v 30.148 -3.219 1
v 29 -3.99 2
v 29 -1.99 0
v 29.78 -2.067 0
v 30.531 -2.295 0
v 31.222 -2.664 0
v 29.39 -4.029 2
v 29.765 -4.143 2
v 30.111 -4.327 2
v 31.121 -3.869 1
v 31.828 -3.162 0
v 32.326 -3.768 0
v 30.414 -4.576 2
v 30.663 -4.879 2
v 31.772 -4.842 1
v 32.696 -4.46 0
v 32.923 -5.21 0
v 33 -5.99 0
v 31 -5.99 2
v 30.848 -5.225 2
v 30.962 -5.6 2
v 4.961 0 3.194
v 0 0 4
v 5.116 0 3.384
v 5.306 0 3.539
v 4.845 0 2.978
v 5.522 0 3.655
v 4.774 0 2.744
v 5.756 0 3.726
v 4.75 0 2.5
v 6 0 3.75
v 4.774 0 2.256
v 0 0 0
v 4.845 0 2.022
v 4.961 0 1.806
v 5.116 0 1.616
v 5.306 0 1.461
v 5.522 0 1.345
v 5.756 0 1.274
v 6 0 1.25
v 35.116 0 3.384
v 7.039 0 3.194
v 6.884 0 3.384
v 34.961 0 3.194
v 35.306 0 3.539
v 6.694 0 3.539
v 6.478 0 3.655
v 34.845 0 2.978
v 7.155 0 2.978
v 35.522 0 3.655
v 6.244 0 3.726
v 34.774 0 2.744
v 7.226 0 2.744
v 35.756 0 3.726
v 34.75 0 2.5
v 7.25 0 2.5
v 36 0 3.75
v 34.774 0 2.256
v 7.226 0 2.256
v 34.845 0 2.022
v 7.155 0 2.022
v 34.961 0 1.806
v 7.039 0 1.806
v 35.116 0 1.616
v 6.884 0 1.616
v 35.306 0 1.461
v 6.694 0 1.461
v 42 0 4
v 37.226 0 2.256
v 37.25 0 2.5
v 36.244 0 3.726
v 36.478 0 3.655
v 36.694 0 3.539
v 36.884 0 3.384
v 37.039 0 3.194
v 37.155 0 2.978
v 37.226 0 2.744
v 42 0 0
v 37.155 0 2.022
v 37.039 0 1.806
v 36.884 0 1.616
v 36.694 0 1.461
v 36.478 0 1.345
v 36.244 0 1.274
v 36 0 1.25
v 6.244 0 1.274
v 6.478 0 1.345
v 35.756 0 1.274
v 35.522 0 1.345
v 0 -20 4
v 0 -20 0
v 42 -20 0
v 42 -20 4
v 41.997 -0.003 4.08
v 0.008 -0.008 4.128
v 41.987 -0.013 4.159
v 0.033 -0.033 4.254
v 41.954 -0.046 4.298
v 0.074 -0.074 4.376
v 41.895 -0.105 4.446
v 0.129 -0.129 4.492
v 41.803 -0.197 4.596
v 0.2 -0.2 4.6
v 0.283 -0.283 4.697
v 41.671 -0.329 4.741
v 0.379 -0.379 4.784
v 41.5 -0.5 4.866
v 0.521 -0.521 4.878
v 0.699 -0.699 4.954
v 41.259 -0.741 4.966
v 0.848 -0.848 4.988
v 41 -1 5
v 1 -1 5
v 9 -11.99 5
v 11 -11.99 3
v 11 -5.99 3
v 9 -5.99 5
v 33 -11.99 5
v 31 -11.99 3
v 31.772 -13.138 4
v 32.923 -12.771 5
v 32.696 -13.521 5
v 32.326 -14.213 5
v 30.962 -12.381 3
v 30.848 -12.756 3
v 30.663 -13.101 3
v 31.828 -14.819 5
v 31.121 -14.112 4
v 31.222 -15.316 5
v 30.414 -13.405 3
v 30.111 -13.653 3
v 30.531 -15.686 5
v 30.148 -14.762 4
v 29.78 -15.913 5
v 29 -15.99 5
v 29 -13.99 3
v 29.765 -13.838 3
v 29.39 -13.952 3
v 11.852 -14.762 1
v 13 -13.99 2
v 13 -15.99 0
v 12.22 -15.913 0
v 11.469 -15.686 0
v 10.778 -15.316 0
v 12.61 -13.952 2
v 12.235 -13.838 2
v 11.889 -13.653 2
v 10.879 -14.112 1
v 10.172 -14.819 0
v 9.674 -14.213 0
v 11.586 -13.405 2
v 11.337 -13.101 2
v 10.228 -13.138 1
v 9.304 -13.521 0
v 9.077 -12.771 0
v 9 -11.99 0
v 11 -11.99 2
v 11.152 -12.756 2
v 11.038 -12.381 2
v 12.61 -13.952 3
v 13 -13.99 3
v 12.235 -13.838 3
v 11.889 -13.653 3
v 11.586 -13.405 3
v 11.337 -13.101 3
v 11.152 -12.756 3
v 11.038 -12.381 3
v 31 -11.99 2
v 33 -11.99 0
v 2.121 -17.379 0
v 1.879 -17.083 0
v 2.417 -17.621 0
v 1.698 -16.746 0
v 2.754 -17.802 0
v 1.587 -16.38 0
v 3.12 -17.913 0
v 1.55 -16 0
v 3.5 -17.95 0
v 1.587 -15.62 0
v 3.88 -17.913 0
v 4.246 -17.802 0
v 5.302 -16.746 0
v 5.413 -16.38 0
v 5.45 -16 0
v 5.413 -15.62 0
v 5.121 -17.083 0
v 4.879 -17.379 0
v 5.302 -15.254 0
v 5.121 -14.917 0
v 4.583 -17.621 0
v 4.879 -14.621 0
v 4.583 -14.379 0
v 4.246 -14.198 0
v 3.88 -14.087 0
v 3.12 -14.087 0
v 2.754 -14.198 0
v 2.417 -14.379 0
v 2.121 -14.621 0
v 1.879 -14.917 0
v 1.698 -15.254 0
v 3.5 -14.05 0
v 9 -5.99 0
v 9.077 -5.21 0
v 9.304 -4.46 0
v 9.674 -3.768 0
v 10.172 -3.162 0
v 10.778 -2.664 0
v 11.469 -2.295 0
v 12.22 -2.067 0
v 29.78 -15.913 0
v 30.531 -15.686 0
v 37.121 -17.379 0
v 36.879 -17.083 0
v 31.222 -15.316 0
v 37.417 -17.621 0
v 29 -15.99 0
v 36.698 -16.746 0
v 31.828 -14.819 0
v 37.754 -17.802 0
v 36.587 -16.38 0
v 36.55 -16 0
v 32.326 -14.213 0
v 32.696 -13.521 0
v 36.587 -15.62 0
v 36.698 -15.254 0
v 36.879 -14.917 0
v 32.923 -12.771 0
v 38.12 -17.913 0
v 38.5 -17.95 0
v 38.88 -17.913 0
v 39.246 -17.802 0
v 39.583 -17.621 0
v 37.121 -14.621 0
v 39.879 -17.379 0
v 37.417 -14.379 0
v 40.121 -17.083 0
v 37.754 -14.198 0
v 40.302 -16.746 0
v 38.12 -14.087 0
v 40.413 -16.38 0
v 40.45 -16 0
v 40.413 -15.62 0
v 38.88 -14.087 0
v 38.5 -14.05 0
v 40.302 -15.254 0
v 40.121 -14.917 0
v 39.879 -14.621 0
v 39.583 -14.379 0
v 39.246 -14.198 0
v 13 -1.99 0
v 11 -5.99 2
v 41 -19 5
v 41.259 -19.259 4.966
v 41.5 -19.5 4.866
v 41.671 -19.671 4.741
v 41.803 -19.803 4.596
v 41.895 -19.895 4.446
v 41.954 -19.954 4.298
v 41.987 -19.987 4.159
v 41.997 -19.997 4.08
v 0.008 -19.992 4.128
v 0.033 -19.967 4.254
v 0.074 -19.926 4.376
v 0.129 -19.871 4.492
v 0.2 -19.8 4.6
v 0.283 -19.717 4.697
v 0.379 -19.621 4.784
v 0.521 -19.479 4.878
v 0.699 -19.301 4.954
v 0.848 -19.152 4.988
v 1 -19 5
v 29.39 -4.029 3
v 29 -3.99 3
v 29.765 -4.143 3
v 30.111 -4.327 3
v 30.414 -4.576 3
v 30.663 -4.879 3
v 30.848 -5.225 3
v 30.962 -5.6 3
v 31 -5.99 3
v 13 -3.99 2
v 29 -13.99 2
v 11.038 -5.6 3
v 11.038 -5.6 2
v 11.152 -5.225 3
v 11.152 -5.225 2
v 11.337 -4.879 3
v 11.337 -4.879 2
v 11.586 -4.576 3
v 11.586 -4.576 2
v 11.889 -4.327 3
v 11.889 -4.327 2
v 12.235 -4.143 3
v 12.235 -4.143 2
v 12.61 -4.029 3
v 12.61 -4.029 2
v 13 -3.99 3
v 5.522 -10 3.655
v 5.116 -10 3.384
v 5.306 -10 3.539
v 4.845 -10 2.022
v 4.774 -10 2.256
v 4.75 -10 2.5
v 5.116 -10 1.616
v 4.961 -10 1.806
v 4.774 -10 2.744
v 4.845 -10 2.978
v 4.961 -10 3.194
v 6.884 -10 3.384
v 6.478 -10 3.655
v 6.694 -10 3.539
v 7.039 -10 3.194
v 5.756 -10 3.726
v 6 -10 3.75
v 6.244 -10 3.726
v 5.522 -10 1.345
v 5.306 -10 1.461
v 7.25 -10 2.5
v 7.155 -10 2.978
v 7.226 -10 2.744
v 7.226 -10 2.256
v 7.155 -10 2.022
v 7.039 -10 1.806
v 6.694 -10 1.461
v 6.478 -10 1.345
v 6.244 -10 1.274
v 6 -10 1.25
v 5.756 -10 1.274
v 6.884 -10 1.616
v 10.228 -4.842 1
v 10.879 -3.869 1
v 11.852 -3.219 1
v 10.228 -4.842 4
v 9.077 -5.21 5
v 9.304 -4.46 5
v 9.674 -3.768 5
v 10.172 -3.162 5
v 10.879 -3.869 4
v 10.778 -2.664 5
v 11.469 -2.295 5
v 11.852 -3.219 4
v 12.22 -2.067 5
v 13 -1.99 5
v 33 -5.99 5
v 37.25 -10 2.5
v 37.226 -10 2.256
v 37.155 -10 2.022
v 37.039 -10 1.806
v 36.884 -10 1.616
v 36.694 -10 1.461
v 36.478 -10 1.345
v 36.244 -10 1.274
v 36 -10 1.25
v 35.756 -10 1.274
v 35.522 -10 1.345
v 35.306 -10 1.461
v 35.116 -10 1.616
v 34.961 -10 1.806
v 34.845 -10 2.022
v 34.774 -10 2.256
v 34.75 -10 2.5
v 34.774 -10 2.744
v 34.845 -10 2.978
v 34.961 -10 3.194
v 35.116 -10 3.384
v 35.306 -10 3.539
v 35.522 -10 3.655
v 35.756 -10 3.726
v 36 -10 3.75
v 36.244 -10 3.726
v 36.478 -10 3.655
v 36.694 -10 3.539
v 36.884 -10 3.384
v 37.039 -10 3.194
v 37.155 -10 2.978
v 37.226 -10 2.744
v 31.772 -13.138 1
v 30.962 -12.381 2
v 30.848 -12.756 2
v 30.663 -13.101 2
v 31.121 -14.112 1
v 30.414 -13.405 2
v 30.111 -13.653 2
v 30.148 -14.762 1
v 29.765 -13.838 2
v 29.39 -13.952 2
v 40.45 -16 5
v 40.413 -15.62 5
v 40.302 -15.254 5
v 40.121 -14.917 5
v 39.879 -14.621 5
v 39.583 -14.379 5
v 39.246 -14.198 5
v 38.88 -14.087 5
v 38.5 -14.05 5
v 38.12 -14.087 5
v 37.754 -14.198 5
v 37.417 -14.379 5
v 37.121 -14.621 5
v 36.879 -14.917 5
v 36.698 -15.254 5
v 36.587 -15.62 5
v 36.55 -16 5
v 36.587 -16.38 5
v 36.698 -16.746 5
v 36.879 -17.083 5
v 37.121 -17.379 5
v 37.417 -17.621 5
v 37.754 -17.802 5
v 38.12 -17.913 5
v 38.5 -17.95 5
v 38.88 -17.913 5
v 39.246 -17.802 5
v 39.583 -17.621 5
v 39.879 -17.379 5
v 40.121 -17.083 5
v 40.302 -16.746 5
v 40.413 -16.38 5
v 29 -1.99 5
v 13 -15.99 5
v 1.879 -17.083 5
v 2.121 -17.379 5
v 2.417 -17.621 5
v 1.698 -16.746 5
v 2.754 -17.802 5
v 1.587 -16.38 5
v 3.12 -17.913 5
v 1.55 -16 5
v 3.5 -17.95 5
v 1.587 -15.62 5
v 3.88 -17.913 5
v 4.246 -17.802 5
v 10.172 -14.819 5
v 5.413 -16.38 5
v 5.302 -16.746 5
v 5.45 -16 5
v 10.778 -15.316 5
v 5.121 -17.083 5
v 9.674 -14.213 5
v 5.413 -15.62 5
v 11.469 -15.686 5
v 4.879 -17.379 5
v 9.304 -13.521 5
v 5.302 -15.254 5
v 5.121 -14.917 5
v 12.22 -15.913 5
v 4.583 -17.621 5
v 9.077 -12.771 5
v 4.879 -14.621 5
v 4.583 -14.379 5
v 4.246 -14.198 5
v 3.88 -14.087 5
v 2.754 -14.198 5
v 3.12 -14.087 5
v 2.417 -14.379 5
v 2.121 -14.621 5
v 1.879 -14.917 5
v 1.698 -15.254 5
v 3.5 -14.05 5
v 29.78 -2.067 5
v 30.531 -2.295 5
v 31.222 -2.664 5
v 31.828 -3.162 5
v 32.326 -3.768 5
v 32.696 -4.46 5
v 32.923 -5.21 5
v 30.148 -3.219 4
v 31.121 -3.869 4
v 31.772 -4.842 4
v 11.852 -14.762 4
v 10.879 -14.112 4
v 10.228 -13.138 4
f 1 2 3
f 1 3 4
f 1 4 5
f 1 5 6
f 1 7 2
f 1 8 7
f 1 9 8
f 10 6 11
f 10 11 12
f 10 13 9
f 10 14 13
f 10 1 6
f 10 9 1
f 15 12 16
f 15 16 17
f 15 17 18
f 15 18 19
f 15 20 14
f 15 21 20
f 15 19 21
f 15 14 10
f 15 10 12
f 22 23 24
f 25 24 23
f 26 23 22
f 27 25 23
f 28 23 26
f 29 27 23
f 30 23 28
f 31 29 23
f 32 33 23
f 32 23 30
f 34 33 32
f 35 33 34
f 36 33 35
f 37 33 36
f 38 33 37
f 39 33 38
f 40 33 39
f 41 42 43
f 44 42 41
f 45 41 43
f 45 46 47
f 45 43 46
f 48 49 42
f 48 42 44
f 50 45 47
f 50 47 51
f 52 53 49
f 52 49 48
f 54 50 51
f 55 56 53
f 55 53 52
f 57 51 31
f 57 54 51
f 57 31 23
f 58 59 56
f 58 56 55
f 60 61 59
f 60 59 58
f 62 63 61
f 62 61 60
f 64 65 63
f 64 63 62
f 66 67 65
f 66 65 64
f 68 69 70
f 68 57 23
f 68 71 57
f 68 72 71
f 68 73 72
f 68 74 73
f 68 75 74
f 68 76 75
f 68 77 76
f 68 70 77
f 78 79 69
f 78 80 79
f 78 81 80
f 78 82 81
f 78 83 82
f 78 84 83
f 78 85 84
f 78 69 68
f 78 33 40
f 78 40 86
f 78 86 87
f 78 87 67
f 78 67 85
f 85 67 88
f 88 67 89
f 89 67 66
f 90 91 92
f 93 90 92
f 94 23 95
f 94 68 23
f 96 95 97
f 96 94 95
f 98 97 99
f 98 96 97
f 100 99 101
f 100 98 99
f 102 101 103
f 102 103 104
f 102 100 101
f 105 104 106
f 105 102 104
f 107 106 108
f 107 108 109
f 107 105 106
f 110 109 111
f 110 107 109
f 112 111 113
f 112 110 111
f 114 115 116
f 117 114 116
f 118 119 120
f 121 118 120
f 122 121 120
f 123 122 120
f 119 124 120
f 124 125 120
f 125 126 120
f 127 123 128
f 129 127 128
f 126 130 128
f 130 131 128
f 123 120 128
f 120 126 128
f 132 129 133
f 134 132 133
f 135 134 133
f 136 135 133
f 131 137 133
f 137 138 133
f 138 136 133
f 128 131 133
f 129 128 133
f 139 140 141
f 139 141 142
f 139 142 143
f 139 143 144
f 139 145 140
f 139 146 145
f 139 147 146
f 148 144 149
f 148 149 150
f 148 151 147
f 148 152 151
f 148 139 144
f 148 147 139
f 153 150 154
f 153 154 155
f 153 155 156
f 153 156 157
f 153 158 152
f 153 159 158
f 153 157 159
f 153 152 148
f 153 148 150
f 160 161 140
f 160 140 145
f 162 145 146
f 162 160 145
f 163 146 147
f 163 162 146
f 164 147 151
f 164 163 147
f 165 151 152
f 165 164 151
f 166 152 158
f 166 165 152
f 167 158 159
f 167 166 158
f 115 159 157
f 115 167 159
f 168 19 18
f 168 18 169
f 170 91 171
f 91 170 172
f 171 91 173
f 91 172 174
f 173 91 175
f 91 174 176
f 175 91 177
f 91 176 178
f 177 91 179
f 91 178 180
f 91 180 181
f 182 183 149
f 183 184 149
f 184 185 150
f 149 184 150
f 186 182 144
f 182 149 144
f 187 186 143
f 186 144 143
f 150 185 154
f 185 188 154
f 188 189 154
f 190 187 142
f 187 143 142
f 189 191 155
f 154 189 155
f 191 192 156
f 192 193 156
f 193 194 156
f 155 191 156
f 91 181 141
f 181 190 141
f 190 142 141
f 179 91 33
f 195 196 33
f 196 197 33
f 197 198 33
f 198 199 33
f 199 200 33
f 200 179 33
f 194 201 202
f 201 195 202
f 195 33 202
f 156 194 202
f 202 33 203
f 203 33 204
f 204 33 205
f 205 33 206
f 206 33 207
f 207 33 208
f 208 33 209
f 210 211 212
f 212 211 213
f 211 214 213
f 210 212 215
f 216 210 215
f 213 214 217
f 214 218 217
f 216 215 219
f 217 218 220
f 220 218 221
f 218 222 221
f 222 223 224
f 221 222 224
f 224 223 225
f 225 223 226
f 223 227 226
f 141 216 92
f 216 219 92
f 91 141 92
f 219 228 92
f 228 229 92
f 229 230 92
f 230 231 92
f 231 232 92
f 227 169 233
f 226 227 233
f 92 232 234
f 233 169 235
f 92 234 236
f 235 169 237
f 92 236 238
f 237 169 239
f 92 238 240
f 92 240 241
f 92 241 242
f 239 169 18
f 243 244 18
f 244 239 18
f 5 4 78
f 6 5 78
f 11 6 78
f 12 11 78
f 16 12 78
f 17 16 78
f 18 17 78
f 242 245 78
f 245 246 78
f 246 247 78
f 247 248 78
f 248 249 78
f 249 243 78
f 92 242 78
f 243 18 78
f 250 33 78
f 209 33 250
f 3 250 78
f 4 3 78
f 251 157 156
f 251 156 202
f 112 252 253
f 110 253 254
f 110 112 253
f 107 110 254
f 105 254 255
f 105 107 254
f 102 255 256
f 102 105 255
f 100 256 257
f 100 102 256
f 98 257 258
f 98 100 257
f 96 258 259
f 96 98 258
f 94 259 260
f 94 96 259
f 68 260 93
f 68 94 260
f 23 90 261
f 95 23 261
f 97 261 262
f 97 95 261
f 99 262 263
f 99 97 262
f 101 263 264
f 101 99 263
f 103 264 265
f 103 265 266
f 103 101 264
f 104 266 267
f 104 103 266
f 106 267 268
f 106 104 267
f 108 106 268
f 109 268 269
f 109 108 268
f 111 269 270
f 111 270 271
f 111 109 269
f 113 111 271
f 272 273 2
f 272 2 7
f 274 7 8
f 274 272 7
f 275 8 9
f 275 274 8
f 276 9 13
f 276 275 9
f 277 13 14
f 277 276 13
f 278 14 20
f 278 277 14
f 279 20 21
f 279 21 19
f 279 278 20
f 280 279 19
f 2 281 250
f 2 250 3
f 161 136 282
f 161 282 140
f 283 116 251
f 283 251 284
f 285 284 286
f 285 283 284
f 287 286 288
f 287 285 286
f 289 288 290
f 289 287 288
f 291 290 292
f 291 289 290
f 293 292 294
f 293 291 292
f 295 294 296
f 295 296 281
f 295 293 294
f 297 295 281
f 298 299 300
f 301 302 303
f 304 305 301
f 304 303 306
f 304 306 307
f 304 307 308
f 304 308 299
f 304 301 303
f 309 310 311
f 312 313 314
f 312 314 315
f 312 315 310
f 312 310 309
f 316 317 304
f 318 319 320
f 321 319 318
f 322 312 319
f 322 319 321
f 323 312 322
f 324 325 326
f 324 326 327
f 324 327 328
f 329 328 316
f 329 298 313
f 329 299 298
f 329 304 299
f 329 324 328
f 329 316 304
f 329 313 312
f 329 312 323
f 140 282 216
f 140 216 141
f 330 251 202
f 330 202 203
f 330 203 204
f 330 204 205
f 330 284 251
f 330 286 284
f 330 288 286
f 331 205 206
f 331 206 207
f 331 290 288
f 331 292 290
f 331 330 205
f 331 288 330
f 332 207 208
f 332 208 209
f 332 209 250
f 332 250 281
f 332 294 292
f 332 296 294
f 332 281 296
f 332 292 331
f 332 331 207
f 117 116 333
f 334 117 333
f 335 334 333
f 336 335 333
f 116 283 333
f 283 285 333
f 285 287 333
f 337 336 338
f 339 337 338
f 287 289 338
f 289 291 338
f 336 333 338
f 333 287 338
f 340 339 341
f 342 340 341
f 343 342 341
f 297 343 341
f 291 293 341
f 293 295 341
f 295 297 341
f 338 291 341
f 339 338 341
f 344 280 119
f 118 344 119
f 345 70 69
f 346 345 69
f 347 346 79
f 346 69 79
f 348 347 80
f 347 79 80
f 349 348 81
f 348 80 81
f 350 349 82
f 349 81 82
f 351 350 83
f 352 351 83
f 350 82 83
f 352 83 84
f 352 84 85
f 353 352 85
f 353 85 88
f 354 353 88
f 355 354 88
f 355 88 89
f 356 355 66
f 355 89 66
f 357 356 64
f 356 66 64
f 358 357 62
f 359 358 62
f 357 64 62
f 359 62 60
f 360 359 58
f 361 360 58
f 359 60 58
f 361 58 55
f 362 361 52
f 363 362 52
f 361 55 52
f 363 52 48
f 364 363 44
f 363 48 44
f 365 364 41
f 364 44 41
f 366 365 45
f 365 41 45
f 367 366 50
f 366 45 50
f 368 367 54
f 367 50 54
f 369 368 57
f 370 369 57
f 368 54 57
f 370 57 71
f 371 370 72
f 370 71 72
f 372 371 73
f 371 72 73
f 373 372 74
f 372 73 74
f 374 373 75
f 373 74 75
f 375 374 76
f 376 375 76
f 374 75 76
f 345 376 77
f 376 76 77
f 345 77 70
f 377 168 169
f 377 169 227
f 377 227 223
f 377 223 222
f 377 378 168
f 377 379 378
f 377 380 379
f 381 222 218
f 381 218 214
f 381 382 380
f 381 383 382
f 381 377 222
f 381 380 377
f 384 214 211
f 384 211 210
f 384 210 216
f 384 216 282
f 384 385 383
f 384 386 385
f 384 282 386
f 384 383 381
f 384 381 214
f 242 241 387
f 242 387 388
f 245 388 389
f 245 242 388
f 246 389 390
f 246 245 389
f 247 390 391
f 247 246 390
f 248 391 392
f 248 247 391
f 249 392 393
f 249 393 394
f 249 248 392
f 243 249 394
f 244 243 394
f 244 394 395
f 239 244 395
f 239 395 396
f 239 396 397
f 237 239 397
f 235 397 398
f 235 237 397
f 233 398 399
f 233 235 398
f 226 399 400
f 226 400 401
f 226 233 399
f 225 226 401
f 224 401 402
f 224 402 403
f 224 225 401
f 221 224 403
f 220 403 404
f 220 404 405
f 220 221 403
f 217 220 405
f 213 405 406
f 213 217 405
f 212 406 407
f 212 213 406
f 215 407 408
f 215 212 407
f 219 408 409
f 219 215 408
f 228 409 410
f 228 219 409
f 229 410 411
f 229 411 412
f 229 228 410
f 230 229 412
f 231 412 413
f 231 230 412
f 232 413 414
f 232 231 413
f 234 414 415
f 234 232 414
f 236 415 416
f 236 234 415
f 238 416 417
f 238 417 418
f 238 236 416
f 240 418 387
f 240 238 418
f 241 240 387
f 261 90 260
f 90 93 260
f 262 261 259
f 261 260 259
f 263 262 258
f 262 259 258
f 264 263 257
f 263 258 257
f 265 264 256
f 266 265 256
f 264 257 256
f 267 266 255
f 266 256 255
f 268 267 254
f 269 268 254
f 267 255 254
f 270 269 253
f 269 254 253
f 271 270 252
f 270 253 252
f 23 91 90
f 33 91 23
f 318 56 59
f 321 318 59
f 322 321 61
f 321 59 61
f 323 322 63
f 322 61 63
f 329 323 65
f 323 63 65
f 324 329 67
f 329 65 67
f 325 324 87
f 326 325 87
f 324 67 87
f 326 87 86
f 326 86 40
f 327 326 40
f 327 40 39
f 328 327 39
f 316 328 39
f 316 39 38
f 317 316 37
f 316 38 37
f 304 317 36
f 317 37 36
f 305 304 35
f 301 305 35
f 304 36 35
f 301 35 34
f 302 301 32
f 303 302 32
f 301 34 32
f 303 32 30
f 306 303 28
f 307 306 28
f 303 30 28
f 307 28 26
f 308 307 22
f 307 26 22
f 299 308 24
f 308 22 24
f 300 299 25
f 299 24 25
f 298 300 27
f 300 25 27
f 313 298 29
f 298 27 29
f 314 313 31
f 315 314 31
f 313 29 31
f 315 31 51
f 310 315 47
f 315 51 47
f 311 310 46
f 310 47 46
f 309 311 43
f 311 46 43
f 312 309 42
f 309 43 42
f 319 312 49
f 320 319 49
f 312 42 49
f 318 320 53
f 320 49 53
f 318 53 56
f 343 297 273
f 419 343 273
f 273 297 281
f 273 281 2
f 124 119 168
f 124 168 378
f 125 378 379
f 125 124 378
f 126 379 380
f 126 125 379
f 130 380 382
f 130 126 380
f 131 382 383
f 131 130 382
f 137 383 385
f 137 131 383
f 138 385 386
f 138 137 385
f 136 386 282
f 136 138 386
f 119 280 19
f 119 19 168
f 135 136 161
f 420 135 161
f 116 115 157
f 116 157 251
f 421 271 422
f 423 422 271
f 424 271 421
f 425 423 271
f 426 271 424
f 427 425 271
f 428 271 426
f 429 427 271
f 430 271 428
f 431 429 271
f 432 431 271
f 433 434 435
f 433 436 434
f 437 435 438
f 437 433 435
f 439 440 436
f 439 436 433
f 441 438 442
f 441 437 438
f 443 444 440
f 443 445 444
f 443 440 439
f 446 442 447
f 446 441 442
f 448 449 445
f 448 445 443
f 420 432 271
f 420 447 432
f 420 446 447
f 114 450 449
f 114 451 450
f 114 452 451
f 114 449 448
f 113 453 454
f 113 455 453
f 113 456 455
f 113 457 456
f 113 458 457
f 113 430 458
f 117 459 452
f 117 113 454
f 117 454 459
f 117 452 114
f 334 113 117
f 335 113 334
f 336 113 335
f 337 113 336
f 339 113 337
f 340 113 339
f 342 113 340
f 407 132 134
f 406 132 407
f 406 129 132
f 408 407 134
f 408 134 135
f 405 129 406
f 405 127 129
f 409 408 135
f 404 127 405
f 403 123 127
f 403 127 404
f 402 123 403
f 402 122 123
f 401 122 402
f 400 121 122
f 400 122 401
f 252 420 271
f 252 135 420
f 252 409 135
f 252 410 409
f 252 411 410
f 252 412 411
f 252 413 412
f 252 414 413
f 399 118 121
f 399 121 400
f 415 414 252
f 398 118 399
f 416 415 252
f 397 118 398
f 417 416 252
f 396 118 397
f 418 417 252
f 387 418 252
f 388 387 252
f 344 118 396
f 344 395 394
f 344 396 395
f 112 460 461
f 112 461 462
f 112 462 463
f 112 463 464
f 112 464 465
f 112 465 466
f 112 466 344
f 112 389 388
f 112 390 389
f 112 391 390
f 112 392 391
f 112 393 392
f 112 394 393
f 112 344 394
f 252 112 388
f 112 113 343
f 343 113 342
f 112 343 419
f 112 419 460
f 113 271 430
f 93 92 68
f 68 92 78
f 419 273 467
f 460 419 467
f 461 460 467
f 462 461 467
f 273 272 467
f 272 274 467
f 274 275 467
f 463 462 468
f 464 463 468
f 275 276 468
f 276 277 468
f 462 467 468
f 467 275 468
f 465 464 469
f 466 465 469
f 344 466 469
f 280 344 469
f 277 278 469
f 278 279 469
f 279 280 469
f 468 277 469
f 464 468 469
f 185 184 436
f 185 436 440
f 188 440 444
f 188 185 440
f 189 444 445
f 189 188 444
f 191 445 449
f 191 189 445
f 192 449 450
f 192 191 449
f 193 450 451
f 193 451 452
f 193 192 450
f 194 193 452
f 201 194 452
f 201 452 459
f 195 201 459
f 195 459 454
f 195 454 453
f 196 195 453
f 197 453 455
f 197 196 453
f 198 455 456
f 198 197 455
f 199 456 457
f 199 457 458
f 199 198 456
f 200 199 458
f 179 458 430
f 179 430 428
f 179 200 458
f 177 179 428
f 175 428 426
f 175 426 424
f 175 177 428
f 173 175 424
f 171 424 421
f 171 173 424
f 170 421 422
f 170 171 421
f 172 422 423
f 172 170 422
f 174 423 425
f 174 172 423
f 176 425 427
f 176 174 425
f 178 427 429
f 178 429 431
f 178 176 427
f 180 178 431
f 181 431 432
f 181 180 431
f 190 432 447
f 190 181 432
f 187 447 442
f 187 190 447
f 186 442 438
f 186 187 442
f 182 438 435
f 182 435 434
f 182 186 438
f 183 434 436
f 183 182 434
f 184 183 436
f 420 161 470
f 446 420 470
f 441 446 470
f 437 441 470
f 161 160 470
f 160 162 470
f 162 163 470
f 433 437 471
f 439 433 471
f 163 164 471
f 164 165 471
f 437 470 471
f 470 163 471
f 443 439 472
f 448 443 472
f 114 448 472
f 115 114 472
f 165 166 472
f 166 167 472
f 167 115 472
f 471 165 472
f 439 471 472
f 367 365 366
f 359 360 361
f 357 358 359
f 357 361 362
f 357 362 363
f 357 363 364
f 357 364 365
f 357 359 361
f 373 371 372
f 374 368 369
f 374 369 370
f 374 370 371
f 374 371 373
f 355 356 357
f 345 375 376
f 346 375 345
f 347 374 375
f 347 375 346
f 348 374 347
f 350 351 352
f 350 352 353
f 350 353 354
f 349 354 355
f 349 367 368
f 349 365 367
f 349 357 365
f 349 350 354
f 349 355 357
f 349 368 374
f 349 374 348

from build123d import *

# Parameters (mm, degrees)
SKETCH1_W           = 42
SKETCH1_H           = 20
SKETCH1_R           = 1.95
BOSS_EXTRUDE1_DEPTH = 5
SKETCH2_R           = 1.25
CUT_EXTRUDE1_DEPTH  = 10
CUT_EXTRUDE2_DEPTH  = 10
FILLET1_R           = 1
CHAMFER1_SIZE       = 2


with BuildPart() as part:
    # Sketch1 → Boss-Extrude1 (new body)
    with BuildSketch(Plane.XY):
        with Locations((21, -10)):
            Rectangle(SKETCH1_W, SKETCH1_H)
        with Locations((38.5, -16)):
            Circle(SKETCH1_R, mode=Mode.SUBTRACT)
        with Locations((3.5, -16)):
            Circle(SKETCH1_R, mode=Mode.SUBTRACT)
    extrude(amount=BOSS_EXTRUDE1_DEPTH)

    # Sketch2 → Cut-Extrude1 (cut)
    with BuildSketch(Plane(origin=(0, 0, 0), x_dir=(1, 0, 0), z_dir=(0, 1, 0))):
        with Locations((36, -2.5)):
            Circle(SKETCH2_R)
        with Locations((6, -2.5)):
            Circle(SKETCH2_R)
    extrude(amount=-CUT_EXTRUDE1_DEPTH, mode=Mode.SUBTRACT)

    # Sketch3 → Cut-Extrude2 (cut)
    with BuildSketch(Plane.XY.offset(5)):
        with BuildLine():
            Line((29, -13.990346174), (13, -13.990346174))
            ThreePointArc((13, -13.990346174), (11.585786438, -13.404559737), (11, -11.990346174))
            Line((11, -11.990346174), (11, -5.990346174))
            ThreePointArc((11, -5.990346174), (11.585786438, -4.576132612), (13, -3.990346174))
            Line((13, -3.990346174), (29, -3.990346174))
            ThreePointArc((29, -3.990346174), (30.414213562, -4.576132612), (31, -5.990346174))
            Line((31, -5.990346174), (31, -11.990346174))
            ThreePointArc((31, -11.990346174), (30.414213562, -13.404559737), (29, -13.990346174))
        make_face()
    extrude(amount=-CUT_EXTRUDE2_DEPTH, mode=Mode.SUBTRACT)

    # Fillet1
    fillet1_edges = [part.edges().sort_by_distance(p)[0] for p in [
        (42, -10, 5),
        (21, 0, 5),
        (0, -10, 5),
        (21, -20, 5),
    ]]
    fillet(fillet1_edges, radius=FILLET1_R)

    # Chamfer1
    chamfer1_edges = [part.edges().sort_by_distance(p)[0] for p in [
        (21, -13.990346174, 0),
        (30.414213562, -13.404559737, 0),
        (31, -8.990346174, 0),
        (30.414213562, -4.576132612, 0),
        (21, -3.990346174, 0),
        (11.585786438, -4.576132612, 0),
        (11, -8.990346174, 0),
        (11.585786438, -13.404559737, 0),
        (11.585786438, -13.404559737, 5),
        (21, -13.990346174, 5),
        (30.414213562, -13.404559737, 5),
        (31, -8.990346174, 5),
        (30.414213562, -4.576132612, 5),
        (21, -3.990346174, 5),
        (11.585786438, -4.576132612, 5),
        (11, -8.990346174, 5),
    ]]
    chamfer(chamfer1_edges, length=CHAMFER1_SIZE)


solid = part.part
